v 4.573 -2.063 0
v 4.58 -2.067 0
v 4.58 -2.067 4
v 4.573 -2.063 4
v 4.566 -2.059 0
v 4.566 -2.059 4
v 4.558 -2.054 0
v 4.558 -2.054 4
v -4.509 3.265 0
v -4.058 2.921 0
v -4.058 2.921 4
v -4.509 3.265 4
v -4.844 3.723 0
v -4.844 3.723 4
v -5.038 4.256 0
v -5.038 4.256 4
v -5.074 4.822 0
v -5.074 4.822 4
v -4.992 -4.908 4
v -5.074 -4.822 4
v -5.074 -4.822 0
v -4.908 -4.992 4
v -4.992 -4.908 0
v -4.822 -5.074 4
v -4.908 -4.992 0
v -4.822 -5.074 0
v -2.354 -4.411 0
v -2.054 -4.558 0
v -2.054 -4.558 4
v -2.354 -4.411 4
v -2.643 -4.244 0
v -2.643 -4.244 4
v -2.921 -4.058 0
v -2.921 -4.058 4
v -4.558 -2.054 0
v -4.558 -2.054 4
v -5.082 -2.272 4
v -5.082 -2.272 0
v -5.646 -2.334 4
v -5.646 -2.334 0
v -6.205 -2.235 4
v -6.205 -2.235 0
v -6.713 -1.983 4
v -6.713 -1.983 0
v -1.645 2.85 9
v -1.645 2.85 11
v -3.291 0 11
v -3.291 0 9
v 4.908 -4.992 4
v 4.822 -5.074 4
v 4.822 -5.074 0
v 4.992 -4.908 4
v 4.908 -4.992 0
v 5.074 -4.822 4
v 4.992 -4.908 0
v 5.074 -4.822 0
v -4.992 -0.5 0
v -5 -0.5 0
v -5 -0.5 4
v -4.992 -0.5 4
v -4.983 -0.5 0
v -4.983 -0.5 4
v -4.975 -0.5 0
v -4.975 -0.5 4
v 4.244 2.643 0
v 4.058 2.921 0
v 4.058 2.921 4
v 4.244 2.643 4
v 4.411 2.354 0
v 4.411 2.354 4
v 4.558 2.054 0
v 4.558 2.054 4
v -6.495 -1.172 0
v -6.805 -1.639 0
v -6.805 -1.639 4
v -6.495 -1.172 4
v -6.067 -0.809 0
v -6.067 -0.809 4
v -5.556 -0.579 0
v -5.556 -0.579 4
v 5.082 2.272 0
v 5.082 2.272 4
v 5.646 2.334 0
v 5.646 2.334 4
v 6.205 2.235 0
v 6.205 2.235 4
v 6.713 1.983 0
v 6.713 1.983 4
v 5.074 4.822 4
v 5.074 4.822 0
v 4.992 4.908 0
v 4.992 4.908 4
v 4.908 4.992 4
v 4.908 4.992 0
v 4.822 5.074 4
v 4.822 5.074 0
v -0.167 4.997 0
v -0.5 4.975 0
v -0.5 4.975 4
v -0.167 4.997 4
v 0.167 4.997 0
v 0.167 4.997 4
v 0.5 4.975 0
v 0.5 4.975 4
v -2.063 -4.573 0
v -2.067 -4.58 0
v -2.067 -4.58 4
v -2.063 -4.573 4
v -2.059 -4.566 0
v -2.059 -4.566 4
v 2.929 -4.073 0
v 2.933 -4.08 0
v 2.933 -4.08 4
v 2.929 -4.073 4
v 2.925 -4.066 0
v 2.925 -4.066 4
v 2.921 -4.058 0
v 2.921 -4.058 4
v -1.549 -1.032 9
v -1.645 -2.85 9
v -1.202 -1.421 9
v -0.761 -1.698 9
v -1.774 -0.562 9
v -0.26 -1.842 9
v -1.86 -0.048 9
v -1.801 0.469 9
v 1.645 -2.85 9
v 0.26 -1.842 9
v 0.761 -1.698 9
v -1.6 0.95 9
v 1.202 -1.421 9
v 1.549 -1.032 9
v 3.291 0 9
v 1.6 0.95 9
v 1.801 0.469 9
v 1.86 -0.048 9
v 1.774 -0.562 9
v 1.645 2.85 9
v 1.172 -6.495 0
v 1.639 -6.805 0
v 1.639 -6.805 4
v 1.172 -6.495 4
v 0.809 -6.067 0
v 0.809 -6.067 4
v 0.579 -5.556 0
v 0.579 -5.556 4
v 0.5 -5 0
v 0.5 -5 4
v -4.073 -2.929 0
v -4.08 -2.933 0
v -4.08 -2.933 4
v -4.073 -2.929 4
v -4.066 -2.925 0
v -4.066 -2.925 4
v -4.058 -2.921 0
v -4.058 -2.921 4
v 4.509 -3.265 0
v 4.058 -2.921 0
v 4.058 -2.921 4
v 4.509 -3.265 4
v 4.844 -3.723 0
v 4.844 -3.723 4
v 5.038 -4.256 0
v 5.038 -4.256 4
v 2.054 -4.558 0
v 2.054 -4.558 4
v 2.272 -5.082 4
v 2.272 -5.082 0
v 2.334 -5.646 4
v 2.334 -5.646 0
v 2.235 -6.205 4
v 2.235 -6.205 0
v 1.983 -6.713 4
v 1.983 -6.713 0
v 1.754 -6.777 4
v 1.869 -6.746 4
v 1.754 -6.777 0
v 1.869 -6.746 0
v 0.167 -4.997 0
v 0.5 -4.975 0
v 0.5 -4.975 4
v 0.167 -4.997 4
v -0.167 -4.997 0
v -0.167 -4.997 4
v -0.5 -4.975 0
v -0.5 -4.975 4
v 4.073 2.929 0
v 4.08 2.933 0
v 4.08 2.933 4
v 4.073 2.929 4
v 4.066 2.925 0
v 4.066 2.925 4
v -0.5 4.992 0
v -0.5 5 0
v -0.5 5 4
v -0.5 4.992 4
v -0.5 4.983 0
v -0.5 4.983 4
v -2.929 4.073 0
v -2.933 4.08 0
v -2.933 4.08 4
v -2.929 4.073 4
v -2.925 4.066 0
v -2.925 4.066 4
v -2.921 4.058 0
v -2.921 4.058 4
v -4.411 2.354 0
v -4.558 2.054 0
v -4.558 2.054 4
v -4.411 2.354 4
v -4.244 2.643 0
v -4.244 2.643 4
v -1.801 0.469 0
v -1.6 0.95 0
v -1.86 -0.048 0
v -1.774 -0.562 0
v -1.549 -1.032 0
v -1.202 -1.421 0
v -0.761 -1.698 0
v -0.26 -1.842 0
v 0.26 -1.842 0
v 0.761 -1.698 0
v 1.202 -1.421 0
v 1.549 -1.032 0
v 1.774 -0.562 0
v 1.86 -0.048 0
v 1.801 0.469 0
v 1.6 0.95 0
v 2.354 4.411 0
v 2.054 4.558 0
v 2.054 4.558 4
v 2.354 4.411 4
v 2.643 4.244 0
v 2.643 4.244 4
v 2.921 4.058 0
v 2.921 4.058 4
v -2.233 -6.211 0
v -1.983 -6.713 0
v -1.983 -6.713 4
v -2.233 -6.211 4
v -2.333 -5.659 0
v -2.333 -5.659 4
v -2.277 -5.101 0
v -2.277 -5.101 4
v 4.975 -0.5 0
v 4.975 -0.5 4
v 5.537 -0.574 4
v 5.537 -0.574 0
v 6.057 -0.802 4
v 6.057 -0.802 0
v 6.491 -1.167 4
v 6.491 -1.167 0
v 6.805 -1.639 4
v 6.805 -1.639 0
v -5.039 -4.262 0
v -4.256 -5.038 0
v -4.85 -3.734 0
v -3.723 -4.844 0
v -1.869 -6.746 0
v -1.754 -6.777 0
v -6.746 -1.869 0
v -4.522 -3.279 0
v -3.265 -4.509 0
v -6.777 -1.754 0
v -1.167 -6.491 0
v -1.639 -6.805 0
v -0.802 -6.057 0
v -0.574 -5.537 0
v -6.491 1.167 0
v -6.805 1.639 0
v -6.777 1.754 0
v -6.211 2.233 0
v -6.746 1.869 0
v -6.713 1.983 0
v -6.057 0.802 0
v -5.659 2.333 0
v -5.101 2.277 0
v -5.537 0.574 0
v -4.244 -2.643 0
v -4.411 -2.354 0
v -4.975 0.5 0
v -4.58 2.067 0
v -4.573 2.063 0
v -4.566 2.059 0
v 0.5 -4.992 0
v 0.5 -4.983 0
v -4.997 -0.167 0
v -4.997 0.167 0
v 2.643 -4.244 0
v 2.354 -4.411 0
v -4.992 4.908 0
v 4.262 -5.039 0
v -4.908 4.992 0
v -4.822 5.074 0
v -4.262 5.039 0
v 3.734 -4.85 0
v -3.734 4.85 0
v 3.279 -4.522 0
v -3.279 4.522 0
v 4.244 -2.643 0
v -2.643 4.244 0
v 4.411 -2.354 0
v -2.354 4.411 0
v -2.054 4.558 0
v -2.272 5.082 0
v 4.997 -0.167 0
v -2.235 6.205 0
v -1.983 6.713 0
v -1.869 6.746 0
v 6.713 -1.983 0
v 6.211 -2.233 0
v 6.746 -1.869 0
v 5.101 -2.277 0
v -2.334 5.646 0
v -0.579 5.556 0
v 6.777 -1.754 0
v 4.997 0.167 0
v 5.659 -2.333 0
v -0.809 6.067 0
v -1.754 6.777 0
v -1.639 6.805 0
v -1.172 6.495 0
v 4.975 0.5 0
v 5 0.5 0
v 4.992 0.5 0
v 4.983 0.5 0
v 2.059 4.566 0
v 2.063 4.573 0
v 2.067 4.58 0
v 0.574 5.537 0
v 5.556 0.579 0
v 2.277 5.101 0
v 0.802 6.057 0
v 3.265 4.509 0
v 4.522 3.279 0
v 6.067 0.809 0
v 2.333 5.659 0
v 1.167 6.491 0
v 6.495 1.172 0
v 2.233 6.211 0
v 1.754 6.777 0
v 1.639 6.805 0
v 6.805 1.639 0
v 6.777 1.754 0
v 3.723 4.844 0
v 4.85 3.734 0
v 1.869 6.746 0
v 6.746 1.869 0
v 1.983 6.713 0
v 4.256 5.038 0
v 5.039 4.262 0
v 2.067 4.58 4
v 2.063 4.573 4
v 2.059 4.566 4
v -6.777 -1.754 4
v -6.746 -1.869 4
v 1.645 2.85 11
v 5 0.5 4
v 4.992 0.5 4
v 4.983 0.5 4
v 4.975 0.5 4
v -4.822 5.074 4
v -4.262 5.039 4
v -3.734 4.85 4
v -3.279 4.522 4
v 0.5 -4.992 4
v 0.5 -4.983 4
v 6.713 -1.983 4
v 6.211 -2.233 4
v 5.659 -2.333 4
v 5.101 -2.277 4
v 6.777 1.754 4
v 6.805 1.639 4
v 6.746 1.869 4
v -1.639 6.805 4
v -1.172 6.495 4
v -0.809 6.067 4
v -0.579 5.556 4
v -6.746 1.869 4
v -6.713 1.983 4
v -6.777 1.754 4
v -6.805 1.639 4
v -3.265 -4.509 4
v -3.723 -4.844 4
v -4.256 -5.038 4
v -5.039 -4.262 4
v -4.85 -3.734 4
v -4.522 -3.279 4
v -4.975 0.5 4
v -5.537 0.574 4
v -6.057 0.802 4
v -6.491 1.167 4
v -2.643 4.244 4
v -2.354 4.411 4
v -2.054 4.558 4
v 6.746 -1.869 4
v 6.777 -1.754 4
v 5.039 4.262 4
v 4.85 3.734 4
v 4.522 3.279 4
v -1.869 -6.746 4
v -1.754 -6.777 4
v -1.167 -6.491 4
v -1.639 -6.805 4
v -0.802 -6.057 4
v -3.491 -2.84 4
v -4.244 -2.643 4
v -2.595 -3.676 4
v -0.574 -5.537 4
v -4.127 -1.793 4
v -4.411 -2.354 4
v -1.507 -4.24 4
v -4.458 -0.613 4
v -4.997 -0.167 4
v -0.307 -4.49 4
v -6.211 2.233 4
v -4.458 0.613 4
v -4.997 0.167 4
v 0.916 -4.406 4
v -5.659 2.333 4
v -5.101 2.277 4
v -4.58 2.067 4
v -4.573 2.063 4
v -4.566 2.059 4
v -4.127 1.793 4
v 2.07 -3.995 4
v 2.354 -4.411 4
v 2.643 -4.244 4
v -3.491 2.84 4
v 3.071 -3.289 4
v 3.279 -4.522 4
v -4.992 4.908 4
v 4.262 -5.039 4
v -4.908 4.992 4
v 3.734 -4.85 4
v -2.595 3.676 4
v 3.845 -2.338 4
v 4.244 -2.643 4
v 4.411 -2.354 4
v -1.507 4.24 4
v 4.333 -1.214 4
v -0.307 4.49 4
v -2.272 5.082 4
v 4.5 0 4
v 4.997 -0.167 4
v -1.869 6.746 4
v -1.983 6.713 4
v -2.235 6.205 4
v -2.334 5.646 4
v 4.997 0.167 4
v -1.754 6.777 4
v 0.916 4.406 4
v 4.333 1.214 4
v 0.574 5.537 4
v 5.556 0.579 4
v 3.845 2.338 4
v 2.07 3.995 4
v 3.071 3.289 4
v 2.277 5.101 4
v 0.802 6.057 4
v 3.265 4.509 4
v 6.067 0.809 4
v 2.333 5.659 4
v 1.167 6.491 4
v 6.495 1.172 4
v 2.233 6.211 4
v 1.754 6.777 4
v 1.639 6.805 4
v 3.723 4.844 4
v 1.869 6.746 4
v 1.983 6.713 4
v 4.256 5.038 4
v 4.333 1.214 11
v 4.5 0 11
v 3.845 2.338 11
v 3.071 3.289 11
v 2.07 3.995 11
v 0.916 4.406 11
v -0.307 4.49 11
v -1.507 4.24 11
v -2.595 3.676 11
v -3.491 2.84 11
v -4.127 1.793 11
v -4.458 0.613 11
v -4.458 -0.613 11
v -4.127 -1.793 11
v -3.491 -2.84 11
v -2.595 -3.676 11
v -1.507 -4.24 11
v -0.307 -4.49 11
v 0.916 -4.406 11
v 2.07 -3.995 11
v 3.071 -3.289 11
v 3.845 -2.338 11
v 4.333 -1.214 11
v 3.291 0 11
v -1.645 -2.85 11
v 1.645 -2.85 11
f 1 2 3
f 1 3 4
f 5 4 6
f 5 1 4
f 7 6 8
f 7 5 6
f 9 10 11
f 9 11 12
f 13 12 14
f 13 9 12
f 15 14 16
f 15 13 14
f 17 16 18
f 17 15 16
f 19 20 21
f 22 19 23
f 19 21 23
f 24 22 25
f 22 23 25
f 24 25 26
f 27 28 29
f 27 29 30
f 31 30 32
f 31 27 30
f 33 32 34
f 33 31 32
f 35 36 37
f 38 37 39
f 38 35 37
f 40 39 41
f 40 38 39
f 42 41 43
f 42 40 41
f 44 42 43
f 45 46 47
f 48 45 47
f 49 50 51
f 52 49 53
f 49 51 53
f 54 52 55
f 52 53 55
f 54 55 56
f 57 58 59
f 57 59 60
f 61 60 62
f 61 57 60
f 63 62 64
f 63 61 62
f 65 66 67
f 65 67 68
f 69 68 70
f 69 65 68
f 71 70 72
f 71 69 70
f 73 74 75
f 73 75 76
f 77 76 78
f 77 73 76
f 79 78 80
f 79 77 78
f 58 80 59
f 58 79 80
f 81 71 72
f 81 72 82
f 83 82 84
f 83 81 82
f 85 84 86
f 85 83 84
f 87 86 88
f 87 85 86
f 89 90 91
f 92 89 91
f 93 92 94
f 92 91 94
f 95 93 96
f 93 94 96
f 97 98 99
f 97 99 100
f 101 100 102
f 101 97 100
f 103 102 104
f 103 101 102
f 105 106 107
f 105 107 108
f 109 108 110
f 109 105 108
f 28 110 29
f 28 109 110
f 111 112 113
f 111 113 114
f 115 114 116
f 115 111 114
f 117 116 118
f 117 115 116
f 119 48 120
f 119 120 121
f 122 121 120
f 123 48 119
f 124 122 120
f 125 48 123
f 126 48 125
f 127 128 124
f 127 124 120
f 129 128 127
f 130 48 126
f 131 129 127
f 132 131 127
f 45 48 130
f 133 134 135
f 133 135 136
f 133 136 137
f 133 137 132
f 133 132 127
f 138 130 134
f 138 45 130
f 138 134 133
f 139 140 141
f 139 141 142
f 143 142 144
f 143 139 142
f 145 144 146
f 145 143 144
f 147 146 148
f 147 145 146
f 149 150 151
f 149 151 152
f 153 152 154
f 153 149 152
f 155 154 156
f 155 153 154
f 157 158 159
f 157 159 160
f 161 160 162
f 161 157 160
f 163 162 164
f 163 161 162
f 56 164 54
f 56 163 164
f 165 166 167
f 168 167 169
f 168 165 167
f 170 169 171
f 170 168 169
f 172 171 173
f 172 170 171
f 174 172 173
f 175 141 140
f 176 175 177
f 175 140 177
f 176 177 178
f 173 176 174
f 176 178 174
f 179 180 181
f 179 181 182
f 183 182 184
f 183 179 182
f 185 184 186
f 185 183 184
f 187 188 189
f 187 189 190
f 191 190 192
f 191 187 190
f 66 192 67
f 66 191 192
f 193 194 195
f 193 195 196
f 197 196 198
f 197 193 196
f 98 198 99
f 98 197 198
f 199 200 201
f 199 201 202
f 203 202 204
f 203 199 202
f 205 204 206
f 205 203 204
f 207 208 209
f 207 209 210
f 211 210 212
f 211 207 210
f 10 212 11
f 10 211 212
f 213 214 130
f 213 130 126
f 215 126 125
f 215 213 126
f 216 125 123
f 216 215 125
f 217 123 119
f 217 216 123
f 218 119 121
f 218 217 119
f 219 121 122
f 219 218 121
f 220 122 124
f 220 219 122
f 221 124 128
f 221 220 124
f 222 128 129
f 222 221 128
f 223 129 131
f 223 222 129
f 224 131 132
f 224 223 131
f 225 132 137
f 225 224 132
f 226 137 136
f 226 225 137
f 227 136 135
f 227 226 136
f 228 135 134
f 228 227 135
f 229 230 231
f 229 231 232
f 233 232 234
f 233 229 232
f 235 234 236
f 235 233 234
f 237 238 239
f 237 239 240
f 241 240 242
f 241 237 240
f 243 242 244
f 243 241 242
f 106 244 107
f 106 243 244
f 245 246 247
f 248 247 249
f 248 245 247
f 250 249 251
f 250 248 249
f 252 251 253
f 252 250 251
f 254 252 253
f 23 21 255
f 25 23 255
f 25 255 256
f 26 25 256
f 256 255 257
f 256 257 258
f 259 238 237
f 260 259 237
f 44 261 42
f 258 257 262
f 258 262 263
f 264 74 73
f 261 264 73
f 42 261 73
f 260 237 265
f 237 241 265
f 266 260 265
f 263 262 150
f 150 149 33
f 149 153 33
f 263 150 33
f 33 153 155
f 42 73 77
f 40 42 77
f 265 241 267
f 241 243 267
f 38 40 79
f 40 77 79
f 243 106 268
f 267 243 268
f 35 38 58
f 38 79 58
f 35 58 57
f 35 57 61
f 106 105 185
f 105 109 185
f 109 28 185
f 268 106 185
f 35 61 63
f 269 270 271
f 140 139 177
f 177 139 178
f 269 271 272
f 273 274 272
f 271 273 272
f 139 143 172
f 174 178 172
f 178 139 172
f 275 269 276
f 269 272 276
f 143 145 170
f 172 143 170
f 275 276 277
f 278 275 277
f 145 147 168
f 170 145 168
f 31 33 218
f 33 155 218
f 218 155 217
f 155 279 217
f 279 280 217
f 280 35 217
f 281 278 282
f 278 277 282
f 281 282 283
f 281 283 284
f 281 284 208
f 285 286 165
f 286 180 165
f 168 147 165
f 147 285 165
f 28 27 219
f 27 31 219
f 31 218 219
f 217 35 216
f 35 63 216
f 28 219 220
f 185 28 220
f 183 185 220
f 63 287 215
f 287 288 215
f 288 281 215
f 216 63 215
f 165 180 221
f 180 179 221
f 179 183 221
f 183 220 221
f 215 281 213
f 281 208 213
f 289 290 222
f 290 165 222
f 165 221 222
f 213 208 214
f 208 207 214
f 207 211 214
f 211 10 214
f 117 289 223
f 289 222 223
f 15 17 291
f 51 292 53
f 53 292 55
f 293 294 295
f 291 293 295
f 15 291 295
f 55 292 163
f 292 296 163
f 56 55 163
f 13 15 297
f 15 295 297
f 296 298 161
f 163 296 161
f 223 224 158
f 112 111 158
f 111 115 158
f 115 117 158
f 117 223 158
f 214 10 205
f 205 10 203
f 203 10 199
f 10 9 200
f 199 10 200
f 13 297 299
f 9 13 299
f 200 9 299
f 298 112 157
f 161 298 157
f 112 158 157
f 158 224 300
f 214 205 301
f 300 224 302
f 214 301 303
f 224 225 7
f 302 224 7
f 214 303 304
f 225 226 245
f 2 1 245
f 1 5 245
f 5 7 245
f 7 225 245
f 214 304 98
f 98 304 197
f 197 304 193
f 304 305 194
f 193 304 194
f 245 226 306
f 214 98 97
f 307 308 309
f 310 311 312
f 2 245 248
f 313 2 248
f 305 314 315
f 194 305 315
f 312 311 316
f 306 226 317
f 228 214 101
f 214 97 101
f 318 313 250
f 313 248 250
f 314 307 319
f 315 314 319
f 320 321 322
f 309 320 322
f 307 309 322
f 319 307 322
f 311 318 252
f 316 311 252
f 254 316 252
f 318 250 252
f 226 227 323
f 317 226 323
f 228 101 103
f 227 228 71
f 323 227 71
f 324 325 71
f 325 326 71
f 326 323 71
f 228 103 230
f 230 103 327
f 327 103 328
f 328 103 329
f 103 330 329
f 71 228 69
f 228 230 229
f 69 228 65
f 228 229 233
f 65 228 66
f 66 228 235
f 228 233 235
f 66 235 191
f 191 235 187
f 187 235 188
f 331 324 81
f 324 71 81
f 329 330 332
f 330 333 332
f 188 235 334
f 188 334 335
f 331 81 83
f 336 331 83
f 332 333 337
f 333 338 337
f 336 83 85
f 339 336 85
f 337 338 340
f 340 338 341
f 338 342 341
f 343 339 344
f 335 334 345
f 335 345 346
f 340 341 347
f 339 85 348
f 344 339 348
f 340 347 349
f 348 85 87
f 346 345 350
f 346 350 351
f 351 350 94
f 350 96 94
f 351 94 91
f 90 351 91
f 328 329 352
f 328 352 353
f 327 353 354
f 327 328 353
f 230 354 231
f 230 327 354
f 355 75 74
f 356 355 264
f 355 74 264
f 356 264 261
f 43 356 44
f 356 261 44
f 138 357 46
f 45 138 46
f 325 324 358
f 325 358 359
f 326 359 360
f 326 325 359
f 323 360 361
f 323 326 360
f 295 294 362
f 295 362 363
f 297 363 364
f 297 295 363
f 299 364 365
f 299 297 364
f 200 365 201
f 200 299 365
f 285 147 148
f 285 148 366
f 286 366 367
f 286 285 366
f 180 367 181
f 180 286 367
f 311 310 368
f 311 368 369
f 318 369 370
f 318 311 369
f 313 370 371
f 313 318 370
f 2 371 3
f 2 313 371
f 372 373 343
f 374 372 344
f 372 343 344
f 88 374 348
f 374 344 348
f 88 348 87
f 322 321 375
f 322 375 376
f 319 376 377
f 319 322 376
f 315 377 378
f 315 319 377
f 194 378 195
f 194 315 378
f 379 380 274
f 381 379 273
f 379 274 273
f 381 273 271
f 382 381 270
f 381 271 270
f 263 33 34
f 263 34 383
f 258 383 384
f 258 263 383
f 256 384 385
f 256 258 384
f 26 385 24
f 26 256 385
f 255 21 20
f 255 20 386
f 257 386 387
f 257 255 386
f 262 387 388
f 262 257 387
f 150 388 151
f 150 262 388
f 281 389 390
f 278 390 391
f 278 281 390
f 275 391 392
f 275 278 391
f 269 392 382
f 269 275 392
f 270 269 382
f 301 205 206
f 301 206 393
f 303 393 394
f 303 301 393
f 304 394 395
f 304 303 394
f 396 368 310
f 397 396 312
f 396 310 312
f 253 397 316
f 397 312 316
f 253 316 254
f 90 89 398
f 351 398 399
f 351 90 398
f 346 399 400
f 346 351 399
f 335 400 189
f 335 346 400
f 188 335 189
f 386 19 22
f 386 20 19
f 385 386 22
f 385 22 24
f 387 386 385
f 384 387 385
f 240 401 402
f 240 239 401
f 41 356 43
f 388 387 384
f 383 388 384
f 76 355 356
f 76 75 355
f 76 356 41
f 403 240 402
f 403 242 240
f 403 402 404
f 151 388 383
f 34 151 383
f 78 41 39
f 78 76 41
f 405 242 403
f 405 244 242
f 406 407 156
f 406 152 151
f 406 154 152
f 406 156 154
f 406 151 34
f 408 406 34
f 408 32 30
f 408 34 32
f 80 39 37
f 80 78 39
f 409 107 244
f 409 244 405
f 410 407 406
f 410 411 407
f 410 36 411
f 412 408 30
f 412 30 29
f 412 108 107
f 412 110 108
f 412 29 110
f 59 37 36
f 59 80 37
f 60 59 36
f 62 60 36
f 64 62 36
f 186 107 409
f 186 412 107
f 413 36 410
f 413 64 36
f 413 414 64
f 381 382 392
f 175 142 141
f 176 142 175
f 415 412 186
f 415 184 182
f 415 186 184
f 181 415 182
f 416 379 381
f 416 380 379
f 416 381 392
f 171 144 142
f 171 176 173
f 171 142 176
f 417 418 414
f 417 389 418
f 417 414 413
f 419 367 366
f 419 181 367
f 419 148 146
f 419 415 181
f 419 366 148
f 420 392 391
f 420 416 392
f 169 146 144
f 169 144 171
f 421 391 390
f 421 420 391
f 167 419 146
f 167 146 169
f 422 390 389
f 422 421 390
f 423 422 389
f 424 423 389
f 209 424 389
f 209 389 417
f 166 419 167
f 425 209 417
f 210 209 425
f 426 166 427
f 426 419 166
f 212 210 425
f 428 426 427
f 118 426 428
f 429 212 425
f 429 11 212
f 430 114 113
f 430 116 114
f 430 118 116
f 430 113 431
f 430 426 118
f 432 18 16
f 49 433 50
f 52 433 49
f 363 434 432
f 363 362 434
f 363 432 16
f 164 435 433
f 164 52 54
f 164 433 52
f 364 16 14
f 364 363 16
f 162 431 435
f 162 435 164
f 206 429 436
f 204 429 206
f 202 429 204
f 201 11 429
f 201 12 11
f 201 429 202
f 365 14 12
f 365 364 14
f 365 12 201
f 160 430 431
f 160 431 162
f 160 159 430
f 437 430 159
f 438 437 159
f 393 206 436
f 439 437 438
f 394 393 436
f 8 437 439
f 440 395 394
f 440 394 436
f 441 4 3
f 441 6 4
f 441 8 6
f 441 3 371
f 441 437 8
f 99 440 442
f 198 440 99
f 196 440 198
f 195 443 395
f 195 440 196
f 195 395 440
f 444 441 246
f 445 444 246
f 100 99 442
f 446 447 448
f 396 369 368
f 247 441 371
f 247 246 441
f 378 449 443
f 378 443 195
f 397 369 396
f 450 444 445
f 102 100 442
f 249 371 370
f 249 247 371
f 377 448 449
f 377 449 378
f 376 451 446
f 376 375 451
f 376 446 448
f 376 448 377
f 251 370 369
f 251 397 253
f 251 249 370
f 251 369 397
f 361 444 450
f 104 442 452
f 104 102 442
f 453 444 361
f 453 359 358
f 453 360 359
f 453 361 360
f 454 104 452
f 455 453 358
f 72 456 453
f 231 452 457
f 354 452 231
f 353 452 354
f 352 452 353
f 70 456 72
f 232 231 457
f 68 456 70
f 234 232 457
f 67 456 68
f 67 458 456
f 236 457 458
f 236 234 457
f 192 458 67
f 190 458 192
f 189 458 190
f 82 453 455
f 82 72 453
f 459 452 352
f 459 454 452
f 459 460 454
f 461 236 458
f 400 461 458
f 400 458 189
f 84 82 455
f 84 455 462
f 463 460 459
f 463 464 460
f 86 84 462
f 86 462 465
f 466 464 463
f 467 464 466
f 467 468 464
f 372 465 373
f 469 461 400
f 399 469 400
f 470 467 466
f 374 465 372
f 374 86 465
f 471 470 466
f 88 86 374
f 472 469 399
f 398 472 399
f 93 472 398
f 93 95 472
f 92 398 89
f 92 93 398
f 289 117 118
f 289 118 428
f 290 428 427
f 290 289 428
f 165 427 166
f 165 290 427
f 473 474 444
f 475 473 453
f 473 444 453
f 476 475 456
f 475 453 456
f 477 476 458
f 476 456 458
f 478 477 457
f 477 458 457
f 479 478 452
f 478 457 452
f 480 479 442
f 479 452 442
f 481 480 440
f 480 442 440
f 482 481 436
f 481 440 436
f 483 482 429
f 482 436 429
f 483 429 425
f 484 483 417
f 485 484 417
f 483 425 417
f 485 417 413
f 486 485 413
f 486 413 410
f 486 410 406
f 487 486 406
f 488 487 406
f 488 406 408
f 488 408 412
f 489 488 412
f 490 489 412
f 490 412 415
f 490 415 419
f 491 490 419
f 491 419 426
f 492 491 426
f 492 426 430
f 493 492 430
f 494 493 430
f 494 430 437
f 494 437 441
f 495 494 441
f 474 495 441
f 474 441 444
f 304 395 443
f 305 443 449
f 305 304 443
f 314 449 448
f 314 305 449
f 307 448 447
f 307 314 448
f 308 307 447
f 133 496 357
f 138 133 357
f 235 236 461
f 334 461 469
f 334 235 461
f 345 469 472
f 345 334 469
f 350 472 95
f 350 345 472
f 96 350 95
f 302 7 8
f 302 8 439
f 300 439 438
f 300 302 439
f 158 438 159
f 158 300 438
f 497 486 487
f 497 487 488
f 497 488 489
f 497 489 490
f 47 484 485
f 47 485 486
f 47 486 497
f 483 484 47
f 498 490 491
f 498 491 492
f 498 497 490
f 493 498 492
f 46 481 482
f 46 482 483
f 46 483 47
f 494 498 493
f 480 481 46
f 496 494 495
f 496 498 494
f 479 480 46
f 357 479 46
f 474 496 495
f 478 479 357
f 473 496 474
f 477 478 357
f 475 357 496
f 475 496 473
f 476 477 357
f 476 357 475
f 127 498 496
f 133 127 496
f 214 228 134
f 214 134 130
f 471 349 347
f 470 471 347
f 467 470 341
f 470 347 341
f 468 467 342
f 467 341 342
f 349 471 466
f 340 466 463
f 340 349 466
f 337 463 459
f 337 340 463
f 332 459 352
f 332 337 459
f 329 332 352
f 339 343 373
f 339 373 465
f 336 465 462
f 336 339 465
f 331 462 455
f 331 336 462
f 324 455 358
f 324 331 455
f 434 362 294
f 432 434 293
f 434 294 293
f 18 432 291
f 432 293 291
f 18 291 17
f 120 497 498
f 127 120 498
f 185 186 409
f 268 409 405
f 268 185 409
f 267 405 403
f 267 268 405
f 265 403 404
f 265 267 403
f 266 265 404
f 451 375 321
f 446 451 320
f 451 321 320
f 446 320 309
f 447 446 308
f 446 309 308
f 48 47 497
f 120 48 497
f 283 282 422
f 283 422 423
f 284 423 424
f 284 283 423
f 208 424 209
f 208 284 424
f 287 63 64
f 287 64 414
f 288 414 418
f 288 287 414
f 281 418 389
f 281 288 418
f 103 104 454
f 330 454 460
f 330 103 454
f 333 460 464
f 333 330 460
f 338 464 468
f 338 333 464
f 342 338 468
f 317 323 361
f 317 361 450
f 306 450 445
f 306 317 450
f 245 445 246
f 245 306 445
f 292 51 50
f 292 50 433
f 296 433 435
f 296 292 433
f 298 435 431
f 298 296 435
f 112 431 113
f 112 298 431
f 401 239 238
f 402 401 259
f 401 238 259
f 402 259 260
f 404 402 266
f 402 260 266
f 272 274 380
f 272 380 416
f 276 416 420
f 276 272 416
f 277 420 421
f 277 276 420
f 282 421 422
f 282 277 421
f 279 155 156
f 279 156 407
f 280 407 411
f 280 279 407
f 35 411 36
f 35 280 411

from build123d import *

# Parameters (mm, degrees)
SKETCH1_R           = 7
SKETCH1_R_2         = 1
BOSS_EXTRUDE1_DEPTH = 4
CUT_EXTRUDE2_DEPTH  = 11.677078252
CIRPATTERN2_COUNT   = 12
SKETCH11_R          = 4.5
BOSS_EXTRUDE2_DEPTH = 11
CUT_EXTRUDE3_START  = 11
CUT_EXTRUDE3_DEPTH  = 2
CUT_EXTRUDE4_DEPTH  = 15.615923436


with BuildPart() as part:
    # Sketch1 → Boss-Extrude1 (new body)
    with BuildSketch(Plane.XY):
        Circle(SKETCH1_R)
        Circle(SKETCH1_R_2, mode=Mode.SUBTRACT)
    extrude(amount=BOSS_EXTRUDE1_DEPTH)

    # Sketch4 → Cut-Extrude2 (cut, through all)
    with BuildSketch(Plane.XY):
        with BuildLine():
            ThreePointArc((-0.50015724, 4.97492138), (0, 5), (0.50015724, 4.97492138))
            ThreePointArc((0.50015724, 4.97492138), (1.158572372, 6.483432479), (2.72550834, 6.98724583))
            ThreePointArc((2.72550834, 6.98724583), (0, 7.5), (-2.72550834, 6.98724583))
            ThreePointArc((-2.72550834, 6.98724583), (-1.167899531, 6.491813775), (-0.5, 5))
            ThreePointArc((-0.5, 5), (-0.500039311, 4.987460443), (-0.50015724, 4.97492138))
        make_face()
    cut_extrude2 = extrude(amount=CUT_EXTRUDE2_DEPTH, mode=Mode.SUBTRACT)

    # CirPattern2: Cut-Extrude2 ×12 about axis
    cirpattern2_axis = Axis((0, 0, 4), (0, 0, -1))
    for i in range(1, CIRPATTERN2_COUNT):
        add(cut_extrude2.rotate(cirpattern2_axis, i * 360 / CIRPATTERN2_COUNT), mode=Mode.SUBTRACT)

    # Sketch11 → Boss-Extrude2 (add)
    with BuildSketch(Plane.XY):
        Circle(SKETCH11_R)
    extrude(amount=BOSS_EXTRUDE2_DEPTH)

    # Sketch12 → Cut-Extrude3 (cut)
    with BuildSketch(Plane.XY.offset(CUT_EXTRUDE3_START)):
        Polygon((3.290896534, 0), (1.645448267, 2.85), (-1.645448267, 2.85), (-3.290896534, 0), (-1.645448267, -2.85), (1.645448267, -2.85), align=None)
    extrude(amount=-CUT_EXTRUDE3_DEPTH, mode=Mode.SUBTRACT)

    # Sketch13 → Cut-Extrude4 (cut, through all)
    with BuildSketch(Plane.XY):
        with BuildLine():
            ThreePointArc((-1.6, 0.95), (0, -1.860779407), (1.6, 0.95))
            Line((1.6, 0.95), (-1.6, 0.95))
        make_face()
    extrude(amount=CUT_EXTRUDE4_DEPTH, mode=Mode.SUBTRACT)


solid = part.part
